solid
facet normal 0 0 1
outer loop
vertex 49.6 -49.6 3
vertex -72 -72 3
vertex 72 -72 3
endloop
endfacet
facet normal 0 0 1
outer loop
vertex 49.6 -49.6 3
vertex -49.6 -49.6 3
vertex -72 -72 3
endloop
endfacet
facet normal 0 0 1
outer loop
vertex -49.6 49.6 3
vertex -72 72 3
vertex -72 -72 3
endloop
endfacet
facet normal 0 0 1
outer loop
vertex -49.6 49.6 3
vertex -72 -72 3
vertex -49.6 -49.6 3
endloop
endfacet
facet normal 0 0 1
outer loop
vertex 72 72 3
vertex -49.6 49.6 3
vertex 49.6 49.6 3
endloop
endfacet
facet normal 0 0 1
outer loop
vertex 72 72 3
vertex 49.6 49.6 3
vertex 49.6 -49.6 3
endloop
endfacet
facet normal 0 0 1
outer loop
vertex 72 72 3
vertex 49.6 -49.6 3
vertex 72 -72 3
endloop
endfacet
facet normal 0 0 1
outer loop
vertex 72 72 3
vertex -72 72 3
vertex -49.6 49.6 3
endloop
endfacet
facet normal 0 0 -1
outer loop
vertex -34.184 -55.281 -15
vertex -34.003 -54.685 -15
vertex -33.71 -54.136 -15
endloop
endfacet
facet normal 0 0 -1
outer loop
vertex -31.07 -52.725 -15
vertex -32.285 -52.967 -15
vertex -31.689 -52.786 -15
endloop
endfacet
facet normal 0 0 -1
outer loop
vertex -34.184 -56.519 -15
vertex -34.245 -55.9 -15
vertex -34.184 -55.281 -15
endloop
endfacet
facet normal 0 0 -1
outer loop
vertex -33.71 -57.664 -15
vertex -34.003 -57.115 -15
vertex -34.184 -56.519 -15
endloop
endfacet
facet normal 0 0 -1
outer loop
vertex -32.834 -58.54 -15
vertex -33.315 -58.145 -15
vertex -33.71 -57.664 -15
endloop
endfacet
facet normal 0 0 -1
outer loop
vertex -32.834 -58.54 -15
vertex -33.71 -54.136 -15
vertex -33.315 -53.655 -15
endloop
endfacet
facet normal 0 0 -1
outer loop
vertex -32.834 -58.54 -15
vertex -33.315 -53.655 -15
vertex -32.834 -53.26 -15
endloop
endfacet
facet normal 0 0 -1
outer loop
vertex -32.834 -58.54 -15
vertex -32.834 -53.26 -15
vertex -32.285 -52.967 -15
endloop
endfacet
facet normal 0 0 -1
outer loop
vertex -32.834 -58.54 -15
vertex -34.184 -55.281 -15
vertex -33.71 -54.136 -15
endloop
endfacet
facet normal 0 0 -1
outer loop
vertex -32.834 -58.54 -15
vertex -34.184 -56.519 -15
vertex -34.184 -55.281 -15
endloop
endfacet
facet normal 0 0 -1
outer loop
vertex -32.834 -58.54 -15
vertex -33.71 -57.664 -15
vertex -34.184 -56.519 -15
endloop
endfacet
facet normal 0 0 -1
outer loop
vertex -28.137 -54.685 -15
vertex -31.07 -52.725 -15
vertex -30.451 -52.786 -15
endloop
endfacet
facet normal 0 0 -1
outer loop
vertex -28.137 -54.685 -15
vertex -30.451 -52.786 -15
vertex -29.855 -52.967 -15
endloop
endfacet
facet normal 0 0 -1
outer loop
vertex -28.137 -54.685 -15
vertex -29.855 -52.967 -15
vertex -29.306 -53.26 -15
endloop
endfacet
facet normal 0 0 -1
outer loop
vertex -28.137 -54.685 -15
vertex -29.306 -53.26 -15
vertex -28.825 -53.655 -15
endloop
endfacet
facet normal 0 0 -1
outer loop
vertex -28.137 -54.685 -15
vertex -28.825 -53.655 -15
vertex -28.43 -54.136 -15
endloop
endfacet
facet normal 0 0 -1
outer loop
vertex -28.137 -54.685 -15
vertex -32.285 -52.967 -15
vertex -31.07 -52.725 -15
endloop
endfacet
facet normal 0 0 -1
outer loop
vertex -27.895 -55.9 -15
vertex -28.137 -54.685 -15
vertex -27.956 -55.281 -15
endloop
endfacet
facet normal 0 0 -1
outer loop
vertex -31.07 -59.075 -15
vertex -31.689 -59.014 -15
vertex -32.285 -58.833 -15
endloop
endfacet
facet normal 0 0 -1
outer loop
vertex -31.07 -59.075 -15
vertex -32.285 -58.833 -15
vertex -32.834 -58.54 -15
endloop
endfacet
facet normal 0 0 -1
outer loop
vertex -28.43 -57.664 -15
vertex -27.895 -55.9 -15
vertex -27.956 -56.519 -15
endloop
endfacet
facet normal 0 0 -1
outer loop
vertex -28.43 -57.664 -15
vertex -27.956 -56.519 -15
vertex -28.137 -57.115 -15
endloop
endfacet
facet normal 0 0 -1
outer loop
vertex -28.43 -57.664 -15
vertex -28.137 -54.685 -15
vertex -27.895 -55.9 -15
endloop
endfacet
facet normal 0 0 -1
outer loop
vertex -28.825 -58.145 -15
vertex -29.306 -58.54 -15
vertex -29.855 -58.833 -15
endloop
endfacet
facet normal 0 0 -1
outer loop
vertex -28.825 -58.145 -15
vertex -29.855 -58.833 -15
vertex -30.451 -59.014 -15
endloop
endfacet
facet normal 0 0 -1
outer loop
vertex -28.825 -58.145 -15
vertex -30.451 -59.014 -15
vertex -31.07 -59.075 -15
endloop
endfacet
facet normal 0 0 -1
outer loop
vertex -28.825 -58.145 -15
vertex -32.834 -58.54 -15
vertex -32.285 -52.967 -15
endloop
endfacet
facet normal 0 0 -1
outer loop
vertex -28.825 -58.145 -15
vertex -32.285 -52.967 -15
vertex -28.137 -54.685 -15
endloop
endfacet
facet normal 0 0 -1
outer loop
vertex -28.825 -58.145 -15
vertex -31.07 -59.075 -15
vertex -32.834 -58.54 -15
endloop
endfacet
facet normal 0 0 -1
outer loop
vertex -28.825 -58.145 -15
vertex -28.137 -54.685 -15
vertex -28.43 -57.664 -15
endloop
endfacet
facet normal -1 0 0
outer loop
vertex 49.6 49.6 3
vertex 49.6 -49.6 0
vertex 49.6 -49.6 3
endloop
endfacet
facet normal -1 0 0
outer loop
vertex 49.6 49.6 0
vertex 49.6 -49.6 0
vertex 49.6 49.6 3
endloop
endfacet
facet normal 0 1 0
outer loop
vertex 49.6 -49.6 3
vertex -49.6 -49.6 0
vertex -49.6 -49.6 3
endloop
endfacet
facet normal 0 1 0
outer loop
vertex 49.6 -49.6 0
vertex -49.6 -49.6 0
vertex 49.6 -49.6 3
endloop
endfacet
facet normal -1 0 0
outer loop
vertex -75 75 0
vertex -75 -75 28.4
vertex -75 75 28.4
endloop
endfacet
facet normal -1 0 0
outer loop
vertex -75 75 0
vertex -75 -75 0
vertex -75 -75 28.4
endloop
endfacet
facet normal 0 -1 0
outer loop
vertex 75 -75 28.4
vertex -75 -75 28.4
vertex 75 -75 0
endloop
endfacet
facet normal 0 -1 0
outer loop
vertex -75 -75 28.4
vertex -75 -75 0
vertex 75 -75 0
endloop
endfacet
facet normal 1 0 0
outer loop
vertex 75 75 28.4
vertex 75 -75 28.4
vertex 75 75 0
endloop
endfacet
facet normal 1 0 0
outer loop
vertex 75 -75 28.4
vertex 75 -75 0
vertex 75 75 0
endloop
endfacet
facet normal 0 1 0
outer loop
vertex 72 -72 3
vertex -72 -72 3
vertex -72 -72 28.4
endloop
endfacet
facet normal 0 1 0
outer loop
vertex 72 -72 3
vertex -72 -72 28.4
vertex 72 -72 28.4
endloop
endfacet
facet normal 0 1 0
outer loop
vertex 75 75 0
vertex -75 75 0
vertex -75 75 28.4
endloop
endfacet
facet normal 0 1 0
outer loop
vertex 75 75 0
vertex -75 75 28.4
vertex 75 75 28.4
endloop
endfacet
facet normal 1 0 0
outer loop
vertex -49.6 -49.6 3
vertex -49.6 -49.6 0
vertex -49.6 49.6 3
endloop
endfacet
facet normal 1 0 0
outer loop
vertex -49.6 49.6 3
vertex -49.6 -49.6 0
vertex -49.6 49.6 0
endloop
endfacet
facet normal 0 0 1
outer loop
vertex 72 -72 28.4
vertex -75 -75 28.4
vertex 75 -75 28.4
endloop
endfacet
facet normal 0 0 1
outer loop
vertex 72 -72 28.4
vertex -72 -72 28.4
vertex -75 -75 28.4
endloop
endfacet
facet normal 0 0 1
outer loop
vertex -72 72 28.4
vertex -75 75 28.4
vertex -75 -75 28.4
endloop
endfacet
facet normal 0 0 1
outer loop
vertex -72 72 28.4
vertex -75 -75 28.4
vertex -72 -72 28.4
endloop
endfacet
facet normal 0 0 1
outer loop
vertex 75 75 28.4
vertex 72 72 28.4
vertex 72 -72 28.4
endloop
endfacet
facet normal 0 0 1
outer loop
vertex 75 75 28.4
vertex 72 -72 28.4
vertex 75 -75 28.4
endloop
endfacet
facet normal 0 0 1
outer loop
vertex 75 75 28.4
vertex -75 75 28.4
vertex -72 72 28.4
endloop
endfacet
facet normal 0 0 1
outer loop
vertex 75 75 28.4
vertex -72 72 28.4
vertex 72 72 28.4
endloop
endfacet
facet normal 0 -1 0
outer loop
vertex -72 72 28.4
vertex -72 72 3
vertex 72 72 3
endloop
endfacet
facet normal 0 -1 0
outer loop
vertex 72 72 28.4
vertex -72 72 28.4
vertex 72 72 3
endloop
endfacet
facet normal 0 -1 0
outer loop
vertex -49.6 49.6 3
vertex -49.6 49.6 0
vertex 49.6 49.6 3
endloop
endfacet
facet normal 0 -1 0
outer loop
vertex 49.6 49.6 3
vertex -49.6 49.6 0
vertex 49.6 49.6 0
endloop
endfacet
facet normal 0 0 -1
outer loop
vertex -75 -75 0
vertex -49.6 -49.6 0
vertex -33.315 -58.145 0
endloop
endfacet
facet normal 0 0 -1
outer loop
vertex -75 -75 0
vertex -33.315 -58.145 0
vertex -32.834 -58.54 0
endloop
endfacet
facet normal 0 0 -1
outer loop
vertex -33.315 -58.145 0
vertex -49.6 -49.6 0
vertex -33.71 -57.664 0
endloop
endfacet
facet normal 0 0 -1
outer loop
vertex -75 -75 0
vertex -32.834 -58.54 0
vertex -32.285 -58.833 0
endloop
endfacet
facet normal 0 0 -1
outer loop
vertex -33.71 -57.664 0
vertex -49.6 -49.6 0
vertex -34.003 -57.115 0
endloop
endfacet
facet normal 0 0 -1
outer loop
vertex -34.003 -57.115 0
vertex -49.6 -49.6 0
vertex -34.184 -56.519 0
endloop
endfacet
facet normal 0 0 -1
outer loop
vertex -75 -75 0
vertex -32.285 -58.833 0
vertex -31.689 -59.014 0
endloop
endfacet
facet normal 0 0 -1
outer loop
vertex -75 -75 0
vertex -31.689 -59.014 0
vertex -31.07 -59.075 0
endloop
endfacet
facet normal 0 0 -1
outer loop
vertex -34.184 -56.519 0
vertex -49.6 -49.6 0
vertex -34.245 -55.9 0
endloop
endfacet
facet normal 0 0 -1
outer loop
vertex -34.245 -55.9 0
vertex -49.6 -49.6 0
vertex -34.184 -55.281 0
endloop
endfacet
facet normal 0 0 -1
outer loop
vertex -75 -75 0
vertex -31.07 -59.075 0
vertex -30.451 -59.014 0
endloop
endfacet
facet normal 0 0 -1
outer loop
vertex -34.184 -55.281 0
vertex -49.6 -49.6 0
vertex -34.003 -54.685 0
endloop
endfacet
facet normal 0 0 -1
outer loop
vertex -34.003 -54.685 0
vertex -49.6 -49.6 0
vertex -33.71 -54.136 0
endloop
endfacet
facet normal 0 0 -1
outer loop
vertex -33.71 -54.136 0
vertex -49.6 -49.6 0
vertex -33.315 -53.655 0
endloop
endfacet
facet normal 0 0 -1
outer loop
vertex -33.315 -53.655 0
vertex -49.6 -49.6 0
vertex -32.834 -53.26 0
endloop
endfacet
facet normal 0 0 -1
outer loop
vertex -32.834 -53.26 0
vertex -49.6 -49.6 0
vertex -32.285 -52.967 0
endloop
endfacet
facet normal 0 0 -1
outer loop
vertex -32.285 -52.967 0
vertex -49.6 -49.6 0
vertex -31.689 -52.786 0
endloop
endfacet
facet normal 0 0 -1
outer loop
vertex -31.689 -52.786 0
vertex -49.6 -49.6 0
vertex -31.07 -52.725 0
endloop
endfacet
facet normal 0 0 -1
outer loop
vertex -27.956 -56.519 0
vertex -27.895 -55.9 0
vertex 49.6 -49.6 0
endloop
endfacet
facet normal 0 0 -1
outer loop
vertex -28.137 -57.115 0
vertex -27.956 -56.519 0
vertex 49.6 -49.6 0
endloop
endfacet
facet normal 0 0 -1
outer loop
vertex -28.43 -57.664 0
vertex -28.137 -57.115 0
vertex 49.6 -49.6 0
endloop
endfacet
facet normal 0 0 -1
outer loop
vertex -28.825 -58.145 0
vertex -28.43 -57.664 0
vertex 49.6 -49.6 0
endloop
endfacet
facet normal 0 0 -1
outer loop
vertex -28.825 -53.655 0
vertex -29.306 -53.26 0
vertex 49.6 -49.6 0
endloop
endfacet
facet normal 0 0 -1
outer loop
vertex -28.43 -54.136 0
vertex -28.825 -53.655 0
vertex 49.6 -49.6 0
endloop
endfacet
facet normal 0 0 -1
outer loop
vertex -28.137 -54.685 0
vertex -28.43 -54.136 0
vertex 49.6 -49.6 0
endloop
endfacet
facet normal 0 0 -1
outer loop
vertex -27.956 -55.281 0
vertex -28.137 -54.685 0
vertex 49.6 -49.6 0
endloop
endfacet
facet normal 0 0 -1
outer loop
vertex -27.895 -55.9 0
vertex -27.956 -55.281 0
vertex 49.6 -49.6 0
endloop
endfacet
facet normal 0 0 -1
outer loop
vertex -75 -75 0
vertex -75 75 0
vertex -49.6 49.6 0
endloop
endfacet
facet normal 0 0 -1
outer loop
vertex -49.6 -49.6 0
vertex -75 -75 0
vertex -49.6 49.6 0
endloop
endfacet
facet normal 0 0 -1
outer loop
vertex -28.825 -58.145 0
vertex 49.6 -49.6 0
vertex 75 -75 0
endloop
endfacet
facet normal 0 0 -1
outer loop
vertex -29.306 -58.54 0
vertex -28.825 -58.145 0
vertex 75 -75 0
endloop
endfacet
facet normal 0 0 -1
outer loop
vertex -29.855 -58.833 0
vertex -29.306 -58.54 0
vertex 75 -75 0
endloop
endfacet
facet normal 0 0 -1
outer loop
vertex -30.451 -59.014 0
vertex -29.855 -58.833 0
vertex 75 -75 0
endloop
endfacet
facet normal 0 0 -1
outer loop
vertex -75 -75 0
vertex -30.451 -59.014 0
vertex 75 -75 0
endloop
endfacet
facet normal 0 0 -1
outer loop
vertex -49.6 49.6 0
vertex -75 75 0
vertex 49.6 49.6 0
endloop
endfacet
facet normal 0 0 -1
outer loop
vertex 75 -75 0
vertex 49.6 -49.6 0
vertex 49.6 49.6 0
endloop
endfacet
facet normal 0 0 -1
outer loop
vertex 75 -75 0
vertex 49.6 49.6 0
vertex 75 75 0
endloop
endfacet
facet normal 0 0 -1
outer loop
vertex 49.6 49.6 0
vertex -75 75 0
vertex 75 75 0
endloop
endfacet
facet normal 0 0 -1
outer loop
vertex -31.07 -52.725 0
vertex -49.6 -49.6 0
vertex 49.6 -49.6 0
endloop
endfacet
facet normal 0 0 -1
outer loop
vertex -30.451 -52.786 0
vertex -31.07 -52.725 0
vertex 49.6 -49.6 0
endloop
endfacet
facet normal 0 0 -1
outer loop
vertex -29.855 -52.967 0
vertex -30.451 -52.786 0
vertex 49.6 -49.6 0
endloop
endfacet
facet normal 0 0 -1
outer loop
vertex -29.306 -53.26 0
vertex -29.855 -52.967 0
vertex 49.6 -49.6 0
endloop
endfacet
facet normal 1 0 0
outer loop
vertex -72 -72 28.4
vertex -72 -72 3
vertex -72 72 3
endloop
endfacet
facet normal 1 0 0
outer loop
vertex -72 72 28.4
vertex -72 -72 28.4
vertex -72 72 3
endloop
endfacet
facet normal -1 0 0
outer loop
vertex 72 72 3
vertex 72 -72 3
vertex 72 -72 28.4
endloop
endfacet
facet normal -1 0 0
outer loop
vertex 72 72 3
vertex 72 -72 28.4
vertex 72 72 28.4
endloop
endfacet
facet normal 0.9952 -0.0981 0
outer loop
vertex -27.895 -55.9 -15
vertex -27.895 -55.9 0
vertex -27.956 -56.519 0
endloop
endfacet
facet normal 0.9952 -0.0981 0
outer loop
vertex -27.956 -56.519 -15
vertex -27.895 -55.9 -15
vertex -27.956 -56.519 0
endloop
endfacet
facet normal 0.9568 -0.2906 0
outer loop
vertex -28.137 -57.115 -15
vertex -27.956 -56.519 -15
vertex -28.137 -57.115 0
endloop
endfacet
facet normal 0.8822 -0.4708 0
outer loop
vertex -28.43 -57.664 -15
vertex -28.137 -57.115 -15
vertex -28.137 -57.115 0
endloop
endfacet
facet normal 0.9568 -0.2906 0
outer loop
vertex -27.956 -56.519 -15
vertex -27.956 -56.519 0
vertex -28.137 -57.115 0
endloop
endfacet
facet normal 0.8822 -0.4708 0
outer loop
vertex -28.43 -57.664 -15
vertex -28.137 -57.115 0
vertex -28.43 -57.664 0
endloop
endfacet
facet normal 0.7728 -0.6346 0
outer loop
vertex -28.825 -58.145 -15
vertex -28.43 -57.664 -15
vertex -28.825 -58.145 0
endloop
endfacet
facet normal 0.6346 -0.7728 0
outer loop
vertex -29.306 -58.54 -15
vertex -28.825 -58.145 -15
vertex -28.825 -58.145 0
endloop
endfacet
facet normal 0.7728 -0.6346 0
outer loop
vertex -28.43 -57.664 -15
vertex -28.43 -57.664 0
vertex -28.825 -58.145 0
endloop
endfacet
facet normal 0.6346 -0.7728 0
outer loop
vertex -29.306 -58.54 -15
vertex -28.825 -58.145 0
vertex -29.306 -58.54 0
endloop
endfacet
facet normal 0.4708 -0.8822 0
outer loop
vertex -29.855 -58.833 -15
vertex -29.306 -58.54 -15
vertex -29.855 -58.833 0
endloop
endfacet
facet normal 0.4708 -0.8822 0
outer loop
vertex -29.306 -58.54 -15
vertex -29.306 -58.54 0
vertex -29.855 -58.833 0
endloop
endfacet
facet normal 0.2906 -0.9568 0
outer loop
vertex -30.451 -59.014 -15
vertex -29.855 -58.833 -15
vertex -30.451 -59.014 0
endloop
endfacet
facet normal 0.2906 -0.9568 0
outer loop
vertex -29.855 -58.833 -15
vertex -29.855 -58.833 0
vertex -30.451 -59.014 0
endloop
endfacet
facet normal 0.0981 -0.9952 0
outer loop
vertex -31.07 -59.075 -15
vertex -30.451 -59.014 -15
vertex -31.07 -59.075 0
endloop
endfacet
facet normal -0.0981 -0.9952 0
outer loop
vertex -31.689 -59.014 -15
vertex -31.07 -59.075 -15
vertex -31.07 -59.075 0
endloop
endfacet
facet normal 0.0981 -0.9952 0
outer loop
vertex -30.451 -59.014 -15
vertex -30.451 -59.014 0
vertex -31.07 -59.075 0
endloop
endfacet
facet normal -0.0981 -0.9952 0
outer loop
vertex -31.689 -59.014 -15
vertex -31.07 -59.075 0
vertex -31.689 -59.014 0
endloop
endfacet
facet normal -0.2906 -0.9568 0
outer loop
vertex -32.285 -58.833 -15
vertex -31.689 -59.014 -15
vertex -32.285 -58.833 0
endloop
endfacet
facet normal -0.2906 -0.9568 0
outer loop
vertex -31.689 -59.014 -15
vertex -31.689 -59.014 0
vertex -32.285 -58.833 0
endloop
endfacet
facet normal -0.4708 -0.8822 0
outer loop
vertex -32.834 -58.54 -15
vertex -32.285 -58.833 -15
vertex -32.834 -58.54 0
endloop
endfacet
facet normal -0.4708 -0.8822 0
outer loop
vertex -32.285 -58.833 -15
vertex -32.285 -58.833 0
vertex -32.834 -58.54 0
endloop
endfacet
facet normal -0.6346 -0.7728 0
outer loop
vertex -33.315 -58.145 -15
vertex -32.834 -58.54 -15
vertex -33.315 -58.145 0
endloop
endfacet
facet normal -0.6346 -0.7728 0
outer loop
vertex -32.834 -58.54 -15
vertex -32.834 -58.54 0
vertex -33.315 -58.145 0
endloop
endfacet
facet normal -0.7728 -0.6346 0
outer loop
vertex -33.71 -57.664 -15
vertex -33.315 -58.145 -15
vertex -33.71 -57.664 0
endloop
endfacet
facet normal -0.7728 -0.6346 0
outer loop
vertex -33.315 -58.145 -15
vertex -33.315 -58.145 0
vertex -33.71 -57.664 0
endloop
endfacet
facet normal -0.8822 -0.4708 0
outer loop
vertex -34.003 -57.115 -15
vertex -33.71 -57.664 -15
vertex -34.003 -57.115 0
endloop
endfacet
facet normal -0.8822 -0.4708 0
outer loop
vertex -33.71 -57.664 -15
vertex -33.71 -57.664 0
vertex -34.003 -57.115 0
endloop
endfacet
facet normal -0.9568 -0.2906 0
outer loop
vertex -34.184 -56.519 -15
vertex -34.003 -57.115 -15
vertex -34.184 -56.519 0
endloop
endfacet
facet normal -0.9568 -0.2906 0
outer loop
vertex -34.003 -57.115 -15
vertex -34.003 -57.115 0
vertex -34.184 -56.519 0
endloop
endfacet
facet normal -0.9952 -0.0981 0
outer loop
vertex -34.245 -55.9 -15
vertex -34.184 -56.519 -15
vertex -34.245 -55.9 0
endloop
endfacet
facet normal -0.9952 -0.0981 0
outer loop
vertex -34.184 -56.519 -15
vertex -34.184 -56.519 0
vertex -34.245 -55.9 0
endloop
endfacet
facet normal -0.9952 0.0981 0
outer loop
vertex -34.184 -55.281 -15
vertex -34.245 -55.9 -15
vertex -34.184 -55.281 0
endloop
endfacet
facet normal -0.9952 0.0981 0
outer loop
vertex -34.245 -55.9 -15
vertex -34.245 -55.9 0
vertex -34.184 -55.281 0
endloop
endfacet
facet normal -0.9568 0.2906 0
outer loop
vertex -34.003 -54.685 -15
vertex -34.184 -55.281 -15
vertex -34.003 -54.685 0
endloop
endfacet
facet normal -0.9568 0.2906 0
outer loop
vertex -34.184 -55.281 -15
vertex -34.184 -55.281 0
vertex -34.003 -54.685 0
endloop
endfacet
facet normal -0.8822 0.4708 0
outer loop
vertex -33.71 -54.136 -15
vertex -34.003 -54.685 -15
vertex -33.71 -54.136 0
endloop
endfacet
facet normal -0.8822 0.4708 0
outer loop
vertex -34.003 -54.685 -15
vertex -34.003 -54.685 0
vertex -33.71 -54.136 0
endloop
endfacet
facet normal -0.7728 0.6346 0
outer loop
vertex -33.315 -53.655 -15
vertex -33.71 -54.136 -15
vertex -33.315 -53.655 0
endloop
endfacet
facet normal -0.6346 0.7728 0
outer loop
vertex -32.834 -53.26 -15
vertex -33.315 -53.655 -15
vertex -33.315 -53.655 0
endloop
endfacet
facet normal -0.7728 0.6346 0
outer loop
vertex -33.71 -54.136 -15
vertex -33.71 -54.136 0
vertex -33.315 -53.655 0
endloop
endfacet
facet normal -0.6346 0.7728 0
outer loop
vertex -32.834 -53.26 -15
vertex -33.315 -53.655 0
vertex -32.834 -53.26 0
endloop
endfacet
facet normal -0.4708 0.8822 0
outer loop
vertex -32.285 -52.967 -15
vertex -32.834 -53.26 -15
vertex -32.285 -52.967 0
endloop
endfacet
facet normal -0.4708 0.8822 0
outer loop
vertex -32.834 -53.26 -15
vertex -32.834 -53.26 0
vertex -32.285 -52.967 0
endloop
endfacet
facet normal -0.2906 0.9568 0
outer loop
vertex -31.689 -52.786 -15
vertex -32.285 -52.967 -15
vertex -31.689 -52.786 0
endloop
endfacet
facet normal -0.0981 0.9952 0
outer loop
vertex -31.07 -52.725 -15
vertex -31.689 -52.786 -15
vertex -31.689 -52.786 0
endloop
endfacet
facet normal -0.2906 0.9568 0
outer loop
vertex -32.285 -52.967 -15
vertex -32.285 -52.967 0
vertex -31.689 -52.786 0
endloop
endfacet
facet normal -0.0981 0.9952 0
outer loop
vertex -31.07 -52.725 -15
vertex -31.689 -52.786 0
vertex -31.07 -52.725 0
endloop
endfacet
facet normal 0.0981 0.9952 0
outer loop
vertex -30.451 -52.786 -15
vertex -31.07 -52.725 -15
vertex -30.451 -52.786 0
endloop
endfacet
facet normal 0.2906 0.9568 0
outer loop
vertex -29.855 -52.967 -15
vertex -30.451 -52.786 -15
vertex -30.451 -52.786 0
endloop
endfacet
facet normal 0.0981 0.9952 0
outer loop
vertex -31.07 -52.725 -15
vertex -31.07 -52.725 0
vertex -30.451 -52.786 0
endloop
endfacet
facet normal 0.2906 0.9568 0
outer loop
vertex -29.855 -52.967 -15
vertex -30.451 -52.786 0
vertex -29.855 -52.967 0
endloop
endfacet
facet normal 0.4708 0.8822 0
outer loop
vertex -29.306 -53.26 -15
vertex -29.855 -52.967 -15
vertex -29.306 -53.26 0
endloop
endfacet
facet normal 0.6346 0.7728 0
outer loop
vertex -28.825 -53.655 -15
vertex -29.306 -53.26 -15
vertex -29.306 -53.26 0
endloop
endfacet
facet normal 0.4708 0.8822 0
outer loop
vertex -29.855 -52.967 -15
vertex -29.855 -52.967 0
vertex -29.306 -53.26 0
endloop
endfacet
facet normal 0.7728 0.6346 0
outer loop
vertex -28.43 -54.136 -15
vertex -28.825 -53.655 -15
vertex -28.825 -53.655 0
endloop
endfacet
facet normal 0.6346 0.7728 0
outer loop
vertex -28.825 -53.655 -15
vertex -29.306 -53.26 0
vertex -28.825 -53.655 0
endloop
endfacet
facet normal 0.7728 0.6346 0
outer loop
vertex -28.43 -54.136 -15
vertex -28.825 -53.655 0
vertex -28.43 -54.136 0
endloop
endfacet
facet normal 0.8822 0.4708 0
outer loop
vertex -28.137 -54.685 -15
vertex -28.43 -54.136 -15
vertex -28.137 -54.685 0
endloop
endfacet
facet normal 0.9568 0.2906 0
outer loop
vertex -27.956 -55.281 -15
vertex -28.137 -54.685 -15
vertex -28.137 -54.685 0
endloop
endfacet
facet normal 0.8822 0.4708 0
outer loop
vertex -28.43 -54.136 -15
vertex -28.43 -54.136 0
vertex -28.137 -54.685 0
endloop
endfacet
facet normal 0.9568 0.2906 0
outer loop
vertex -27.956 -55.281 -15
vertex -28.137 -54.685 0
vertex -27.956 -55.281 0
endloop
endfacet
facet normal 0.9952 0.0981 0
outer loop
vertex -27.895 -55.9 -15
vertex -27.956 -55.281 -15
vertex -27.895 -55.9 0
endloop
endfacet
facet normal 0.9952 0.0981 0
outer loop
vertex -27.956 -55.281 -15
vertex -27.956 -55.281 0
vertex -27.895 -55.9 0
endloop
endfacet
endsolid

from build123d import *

# Parameters (mm, degrees)
CROQUIS2_W              = 150
CROQUIS2_H              = 150
CROQUIS2_W_2            = 99.2
CROQUIS2_H_2            = 99.2
SALIENTE_EXTRUIR1_DEPTH = 3
CROQUIS5_W              = 150
CROQUIS5_H              = 150
CROQUIS5_W_2            = 144
CROQUIS5_H_2            = 144
SALIENTE_EXTRUIR2_DEPTH = 25.4
CROQUIS6_R              = 3.175
SALIENTE_EXTRUIR3_DEPTH = 15


with BuildPart() as part:
    # Croquis2 → Saliente-Extruir1 (new body)
    with BuildSketch(Plane.XY):
        Rectangle(CROQUIS2_W, CROQUIS2_H)
        Rectangle(CROQUIS2_W_2, CROQUIS2_H_2, mode=Mode.SUBTRACT)
    extrude(amount=SALIENTE_EXTRUIR1_DEPTH)

    # Croquis5 → Saliente-Extruir2 (add)
    with BuildSketch(Plane.XY.offset(3)):
        Rectangle(CROQUIS5_W, CROQUIS5_H)
        Rectangle(CROQUIS5_W_2, CROQUIS5_H_2, mode=Mode.SUBTRACT)
    extrude(amount=SALIENTE_EXTRUIR2_DEPTH)

    # Croquis6 → Saliente-Extruir3 (add)
    with BuildSketch(Plane(origin=(0, 0, 0), x_dir=(-1, 0, 0), z_dir=(0, 0, -1))):
        with Locations(Location((31.07, -55.9, 0), (0, 0, 180))):
            Circle(CROQUIS6_R)
    extrude(amount=SALIENTE_EXTRUIR3_DEPTH)


solid = part.part
